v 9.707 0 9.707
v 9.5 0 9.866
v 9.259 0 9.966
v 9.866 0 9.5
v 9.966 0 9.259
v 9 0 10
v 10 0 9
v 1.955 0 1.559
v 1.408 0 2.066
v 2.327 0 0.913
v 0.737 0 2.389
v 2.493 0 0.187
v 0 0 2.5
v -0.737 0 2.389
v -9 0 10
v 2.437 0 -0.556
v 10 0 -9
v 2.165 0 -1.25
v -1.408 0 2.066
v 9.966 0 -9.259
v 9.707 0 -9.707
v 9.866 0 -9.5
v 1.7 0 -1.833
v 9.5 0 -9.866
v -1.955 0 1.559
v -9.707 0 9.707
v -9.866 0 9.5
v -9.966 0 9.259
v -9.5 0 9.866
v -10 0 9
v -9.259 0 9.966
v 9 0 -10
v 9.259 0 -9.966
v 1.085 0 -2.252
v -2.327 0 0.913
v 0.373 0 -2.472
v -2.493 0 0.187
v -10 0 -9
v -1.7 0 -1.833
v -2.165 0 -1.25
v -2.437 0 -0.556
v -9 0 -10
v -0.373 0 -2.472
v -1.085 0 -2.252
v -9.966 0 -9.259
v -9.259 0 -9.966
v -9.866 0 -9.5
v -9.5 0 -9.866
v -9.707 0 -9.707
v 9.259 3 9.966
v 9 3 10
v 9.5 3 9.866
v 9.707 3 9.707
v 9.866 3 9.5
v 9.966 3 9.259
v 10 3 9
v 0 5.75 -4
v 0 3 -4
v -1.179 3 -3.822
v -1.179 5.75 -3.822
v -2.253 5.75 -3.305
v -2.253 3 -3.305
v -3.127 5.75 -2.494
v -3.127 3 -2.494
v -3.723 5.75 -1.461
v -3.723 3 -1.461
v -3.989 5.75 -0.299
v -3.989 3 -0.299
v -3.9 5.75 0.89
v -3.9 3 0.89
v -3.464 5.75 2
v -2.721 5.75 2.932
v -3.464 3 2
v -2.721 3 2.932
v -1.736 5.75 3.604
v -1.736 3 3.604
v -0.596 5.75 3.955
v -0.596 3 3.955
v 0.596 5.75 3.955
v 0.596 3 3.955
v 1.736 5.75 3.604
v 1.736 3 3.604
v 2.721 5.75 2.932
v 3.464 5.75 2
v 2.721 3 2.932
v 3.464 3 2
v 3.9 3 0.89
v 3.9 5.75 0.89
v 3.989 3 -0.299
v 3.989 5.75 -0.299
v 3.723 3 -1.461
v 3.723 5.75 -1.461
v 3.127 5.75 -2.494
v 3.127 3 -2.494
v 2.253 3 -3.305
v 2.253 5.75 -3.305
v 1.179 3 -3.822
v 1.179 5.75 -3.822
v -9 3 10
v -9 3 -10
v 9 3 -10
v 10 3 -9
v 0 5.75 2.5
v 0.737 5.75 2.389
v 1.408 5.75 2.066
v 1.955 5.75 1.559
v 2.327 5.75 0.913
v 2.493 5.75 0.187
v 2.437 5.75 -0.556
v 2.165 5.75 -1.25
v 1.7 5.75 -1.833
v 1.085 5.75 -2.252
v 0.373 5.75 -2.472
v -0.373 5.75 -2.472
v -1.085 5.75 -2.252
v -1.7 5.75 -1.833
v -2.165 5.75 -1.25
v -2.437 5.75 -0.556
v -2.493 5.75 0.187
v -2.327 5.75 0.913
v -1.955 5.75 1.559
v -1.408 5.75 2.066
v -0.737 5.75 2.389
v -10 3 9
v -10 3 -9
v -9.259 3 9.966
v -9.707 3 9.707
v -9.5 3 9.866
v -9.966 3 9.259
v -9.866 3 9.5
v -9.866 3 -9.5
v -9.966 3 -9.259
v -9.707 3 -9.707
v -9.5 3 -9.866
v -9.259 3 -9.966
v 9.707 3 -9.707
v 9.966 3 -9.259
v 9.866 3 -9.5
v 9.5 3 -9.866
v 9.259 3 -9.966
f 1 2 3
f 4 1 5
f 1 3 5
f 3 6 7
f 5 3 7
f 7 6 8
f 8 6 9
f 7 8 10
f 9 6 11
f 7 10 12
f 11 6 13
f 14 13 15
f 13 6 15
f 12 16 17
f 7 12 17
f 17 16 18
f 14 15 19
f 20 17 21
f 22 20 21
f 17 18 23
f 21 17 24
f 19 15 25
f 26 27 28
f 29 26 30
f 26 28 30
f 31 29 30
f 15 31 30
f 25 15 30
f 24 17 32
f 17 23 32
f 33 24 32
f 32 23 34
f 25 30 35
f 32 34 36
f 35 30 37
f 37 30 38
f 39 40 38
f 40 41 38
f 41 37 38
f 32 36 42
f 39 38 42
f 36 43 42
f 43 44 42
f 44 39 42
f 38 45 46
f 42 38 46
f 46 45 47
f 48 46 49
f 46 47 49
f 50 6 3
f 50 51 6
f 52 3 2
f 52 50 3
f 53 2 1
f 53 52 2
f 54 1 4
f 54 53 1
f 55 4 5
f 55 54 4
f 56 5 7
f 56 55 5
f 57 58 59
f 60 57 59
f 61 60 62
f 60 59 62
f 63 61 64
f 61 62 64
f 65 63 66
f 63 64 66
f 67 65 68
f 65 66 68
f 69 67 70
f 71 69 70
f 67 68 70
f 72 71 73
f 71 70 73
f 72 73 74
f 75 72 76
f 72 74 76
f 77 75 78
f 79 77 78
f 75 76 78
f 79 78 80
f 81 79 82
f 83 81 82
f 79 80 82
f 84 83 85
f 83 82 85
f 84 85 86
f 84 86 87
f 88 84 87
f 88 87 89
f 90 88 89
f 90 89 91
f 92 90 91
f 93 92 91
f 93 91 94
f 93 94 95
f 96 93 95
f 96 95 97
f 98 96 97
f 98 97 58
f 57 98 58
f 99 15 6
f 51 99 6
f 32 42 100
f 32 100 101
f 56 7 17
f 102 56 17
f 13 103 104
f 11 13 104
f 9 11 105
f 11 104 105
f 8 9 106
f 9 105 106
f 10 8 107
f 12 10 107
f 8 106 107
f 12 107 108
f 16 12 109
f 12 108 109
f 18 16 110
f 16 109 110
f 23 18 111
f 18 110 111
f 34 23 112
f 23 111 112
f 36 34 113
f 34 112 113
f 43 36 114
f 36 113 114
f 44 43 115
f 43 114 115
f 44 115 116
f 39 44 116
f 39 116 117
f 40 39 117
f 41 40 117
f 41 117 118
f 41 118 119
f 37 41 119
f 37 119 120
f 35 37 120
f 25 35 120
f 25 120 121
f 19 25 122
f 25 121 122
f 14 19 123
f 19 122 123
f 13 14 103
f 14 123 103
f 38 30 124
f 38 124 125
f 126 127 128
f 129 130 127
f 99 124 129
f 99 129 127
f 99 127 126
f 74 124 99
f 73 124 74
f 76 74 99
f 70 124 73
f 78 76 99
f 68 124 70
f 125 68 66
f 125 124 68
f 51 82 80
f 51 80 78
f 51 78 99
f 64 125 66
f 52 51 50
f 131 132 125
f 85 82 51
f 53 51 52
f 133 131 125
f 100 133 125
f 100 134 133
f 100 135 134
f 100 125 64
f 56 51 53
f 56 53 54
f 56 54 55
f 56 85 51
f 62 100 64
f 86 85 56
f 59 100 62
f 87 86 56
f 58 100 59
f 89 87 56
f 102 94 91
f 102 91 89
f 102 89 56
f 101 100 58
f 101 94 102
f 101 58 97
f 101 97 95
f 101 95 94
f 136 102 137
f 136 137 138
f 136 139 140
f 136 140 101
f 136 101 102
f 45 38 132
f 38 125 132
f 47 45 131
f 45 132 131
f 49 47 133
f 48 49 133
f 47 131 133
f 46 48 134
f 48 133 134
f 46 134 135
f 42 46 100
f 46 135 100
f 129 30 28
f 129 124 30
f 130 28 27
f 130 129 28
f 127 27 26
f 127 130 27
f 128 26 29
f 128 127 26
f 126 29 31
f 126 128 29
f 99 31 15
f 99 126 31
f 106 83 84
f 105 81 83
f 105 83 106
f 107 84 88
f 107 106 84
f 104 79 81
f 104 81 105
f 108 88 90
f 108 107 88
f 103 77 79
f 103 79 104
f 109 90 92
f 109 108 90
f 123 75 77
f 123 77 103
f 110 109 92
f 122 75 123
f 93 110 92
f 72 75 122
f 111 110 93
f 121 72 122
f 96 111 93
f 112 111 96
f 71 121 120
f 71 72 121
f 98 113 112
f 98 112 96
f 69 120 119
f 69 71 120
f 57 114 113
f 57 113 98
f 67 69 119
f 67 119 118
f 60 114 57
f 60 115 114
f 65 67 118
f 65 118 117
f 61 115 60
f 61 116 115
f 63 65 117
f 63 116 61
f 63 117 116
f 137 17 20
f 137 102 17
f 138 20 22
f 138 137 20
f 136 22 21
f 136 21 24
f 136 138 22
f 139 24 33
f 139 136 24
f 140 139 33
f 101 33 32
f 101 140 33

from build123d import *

# Parameters (mm, degrees)
SKETCH1_W           = 20
SKETCH1_H           = 20
BOSS_EXTRUDE1_DEPTH = 3
FILLET1_R           = 1
SKETCH1_3_R         = 4
BOSS_EXTRUDE2_DEPTH = 5.75
SKETCH2_R           = 2.5
CUT_EXTRUDE1_DEPTH  = 5.75


with BuildPart() as part:
    # Sketch1 → Boss-Extrude1 (new body)
    with BuildSketch(Plane(origin=(0, 0, 0), x_dir=(1, 0, 0), z_dir=(0, 1, 0))):
        Rectangle(SKETCH1_W, SKETCH1_H)
    extrude(amount=BOSS_EXTRUDE1_DEPTH)

    # Fillet1
    fillet1_edges = [part.edges().sort_by_distance(p)[0] for p in [
        (-10, 1.5, -10),
        (-10, 1.5, 10),
        (10, 1.5, 10),
        (10, 1.5, -10),
    ]]
    fillet(fillet1_edges, radius=FILLET1_R)

    # Sketch1<3> → Boss-Extrude2 (add)
    with BuildSketch(Plane(origin=(0, 0, 0), x_dir=(1, 0, 0), z_dir=(0, 1, 0))):
        with Locations(Location((0, 0, 0), (0, 0, 90))):
            Circle(SKETCH1_3_R)
    extrude(amount=BOSS_EXTRUDE2_DEPTH)

    # Sketch2 → Cut-Extrude1 (cut)
    with BuildSketch(Plane(origin=(0, 5.75, 0), x_dir=(1, 0, 0), z_dir=(0, 1, 0))):
        with Locations(Location((0, 0, 0), (0, 0, 270))):
            Circle(SKETCH2_R)
    extrude(amount=-CUT_EXTRUDE1_DEPTH, mode=Mode.SUBTRACT)


solid = part.part
